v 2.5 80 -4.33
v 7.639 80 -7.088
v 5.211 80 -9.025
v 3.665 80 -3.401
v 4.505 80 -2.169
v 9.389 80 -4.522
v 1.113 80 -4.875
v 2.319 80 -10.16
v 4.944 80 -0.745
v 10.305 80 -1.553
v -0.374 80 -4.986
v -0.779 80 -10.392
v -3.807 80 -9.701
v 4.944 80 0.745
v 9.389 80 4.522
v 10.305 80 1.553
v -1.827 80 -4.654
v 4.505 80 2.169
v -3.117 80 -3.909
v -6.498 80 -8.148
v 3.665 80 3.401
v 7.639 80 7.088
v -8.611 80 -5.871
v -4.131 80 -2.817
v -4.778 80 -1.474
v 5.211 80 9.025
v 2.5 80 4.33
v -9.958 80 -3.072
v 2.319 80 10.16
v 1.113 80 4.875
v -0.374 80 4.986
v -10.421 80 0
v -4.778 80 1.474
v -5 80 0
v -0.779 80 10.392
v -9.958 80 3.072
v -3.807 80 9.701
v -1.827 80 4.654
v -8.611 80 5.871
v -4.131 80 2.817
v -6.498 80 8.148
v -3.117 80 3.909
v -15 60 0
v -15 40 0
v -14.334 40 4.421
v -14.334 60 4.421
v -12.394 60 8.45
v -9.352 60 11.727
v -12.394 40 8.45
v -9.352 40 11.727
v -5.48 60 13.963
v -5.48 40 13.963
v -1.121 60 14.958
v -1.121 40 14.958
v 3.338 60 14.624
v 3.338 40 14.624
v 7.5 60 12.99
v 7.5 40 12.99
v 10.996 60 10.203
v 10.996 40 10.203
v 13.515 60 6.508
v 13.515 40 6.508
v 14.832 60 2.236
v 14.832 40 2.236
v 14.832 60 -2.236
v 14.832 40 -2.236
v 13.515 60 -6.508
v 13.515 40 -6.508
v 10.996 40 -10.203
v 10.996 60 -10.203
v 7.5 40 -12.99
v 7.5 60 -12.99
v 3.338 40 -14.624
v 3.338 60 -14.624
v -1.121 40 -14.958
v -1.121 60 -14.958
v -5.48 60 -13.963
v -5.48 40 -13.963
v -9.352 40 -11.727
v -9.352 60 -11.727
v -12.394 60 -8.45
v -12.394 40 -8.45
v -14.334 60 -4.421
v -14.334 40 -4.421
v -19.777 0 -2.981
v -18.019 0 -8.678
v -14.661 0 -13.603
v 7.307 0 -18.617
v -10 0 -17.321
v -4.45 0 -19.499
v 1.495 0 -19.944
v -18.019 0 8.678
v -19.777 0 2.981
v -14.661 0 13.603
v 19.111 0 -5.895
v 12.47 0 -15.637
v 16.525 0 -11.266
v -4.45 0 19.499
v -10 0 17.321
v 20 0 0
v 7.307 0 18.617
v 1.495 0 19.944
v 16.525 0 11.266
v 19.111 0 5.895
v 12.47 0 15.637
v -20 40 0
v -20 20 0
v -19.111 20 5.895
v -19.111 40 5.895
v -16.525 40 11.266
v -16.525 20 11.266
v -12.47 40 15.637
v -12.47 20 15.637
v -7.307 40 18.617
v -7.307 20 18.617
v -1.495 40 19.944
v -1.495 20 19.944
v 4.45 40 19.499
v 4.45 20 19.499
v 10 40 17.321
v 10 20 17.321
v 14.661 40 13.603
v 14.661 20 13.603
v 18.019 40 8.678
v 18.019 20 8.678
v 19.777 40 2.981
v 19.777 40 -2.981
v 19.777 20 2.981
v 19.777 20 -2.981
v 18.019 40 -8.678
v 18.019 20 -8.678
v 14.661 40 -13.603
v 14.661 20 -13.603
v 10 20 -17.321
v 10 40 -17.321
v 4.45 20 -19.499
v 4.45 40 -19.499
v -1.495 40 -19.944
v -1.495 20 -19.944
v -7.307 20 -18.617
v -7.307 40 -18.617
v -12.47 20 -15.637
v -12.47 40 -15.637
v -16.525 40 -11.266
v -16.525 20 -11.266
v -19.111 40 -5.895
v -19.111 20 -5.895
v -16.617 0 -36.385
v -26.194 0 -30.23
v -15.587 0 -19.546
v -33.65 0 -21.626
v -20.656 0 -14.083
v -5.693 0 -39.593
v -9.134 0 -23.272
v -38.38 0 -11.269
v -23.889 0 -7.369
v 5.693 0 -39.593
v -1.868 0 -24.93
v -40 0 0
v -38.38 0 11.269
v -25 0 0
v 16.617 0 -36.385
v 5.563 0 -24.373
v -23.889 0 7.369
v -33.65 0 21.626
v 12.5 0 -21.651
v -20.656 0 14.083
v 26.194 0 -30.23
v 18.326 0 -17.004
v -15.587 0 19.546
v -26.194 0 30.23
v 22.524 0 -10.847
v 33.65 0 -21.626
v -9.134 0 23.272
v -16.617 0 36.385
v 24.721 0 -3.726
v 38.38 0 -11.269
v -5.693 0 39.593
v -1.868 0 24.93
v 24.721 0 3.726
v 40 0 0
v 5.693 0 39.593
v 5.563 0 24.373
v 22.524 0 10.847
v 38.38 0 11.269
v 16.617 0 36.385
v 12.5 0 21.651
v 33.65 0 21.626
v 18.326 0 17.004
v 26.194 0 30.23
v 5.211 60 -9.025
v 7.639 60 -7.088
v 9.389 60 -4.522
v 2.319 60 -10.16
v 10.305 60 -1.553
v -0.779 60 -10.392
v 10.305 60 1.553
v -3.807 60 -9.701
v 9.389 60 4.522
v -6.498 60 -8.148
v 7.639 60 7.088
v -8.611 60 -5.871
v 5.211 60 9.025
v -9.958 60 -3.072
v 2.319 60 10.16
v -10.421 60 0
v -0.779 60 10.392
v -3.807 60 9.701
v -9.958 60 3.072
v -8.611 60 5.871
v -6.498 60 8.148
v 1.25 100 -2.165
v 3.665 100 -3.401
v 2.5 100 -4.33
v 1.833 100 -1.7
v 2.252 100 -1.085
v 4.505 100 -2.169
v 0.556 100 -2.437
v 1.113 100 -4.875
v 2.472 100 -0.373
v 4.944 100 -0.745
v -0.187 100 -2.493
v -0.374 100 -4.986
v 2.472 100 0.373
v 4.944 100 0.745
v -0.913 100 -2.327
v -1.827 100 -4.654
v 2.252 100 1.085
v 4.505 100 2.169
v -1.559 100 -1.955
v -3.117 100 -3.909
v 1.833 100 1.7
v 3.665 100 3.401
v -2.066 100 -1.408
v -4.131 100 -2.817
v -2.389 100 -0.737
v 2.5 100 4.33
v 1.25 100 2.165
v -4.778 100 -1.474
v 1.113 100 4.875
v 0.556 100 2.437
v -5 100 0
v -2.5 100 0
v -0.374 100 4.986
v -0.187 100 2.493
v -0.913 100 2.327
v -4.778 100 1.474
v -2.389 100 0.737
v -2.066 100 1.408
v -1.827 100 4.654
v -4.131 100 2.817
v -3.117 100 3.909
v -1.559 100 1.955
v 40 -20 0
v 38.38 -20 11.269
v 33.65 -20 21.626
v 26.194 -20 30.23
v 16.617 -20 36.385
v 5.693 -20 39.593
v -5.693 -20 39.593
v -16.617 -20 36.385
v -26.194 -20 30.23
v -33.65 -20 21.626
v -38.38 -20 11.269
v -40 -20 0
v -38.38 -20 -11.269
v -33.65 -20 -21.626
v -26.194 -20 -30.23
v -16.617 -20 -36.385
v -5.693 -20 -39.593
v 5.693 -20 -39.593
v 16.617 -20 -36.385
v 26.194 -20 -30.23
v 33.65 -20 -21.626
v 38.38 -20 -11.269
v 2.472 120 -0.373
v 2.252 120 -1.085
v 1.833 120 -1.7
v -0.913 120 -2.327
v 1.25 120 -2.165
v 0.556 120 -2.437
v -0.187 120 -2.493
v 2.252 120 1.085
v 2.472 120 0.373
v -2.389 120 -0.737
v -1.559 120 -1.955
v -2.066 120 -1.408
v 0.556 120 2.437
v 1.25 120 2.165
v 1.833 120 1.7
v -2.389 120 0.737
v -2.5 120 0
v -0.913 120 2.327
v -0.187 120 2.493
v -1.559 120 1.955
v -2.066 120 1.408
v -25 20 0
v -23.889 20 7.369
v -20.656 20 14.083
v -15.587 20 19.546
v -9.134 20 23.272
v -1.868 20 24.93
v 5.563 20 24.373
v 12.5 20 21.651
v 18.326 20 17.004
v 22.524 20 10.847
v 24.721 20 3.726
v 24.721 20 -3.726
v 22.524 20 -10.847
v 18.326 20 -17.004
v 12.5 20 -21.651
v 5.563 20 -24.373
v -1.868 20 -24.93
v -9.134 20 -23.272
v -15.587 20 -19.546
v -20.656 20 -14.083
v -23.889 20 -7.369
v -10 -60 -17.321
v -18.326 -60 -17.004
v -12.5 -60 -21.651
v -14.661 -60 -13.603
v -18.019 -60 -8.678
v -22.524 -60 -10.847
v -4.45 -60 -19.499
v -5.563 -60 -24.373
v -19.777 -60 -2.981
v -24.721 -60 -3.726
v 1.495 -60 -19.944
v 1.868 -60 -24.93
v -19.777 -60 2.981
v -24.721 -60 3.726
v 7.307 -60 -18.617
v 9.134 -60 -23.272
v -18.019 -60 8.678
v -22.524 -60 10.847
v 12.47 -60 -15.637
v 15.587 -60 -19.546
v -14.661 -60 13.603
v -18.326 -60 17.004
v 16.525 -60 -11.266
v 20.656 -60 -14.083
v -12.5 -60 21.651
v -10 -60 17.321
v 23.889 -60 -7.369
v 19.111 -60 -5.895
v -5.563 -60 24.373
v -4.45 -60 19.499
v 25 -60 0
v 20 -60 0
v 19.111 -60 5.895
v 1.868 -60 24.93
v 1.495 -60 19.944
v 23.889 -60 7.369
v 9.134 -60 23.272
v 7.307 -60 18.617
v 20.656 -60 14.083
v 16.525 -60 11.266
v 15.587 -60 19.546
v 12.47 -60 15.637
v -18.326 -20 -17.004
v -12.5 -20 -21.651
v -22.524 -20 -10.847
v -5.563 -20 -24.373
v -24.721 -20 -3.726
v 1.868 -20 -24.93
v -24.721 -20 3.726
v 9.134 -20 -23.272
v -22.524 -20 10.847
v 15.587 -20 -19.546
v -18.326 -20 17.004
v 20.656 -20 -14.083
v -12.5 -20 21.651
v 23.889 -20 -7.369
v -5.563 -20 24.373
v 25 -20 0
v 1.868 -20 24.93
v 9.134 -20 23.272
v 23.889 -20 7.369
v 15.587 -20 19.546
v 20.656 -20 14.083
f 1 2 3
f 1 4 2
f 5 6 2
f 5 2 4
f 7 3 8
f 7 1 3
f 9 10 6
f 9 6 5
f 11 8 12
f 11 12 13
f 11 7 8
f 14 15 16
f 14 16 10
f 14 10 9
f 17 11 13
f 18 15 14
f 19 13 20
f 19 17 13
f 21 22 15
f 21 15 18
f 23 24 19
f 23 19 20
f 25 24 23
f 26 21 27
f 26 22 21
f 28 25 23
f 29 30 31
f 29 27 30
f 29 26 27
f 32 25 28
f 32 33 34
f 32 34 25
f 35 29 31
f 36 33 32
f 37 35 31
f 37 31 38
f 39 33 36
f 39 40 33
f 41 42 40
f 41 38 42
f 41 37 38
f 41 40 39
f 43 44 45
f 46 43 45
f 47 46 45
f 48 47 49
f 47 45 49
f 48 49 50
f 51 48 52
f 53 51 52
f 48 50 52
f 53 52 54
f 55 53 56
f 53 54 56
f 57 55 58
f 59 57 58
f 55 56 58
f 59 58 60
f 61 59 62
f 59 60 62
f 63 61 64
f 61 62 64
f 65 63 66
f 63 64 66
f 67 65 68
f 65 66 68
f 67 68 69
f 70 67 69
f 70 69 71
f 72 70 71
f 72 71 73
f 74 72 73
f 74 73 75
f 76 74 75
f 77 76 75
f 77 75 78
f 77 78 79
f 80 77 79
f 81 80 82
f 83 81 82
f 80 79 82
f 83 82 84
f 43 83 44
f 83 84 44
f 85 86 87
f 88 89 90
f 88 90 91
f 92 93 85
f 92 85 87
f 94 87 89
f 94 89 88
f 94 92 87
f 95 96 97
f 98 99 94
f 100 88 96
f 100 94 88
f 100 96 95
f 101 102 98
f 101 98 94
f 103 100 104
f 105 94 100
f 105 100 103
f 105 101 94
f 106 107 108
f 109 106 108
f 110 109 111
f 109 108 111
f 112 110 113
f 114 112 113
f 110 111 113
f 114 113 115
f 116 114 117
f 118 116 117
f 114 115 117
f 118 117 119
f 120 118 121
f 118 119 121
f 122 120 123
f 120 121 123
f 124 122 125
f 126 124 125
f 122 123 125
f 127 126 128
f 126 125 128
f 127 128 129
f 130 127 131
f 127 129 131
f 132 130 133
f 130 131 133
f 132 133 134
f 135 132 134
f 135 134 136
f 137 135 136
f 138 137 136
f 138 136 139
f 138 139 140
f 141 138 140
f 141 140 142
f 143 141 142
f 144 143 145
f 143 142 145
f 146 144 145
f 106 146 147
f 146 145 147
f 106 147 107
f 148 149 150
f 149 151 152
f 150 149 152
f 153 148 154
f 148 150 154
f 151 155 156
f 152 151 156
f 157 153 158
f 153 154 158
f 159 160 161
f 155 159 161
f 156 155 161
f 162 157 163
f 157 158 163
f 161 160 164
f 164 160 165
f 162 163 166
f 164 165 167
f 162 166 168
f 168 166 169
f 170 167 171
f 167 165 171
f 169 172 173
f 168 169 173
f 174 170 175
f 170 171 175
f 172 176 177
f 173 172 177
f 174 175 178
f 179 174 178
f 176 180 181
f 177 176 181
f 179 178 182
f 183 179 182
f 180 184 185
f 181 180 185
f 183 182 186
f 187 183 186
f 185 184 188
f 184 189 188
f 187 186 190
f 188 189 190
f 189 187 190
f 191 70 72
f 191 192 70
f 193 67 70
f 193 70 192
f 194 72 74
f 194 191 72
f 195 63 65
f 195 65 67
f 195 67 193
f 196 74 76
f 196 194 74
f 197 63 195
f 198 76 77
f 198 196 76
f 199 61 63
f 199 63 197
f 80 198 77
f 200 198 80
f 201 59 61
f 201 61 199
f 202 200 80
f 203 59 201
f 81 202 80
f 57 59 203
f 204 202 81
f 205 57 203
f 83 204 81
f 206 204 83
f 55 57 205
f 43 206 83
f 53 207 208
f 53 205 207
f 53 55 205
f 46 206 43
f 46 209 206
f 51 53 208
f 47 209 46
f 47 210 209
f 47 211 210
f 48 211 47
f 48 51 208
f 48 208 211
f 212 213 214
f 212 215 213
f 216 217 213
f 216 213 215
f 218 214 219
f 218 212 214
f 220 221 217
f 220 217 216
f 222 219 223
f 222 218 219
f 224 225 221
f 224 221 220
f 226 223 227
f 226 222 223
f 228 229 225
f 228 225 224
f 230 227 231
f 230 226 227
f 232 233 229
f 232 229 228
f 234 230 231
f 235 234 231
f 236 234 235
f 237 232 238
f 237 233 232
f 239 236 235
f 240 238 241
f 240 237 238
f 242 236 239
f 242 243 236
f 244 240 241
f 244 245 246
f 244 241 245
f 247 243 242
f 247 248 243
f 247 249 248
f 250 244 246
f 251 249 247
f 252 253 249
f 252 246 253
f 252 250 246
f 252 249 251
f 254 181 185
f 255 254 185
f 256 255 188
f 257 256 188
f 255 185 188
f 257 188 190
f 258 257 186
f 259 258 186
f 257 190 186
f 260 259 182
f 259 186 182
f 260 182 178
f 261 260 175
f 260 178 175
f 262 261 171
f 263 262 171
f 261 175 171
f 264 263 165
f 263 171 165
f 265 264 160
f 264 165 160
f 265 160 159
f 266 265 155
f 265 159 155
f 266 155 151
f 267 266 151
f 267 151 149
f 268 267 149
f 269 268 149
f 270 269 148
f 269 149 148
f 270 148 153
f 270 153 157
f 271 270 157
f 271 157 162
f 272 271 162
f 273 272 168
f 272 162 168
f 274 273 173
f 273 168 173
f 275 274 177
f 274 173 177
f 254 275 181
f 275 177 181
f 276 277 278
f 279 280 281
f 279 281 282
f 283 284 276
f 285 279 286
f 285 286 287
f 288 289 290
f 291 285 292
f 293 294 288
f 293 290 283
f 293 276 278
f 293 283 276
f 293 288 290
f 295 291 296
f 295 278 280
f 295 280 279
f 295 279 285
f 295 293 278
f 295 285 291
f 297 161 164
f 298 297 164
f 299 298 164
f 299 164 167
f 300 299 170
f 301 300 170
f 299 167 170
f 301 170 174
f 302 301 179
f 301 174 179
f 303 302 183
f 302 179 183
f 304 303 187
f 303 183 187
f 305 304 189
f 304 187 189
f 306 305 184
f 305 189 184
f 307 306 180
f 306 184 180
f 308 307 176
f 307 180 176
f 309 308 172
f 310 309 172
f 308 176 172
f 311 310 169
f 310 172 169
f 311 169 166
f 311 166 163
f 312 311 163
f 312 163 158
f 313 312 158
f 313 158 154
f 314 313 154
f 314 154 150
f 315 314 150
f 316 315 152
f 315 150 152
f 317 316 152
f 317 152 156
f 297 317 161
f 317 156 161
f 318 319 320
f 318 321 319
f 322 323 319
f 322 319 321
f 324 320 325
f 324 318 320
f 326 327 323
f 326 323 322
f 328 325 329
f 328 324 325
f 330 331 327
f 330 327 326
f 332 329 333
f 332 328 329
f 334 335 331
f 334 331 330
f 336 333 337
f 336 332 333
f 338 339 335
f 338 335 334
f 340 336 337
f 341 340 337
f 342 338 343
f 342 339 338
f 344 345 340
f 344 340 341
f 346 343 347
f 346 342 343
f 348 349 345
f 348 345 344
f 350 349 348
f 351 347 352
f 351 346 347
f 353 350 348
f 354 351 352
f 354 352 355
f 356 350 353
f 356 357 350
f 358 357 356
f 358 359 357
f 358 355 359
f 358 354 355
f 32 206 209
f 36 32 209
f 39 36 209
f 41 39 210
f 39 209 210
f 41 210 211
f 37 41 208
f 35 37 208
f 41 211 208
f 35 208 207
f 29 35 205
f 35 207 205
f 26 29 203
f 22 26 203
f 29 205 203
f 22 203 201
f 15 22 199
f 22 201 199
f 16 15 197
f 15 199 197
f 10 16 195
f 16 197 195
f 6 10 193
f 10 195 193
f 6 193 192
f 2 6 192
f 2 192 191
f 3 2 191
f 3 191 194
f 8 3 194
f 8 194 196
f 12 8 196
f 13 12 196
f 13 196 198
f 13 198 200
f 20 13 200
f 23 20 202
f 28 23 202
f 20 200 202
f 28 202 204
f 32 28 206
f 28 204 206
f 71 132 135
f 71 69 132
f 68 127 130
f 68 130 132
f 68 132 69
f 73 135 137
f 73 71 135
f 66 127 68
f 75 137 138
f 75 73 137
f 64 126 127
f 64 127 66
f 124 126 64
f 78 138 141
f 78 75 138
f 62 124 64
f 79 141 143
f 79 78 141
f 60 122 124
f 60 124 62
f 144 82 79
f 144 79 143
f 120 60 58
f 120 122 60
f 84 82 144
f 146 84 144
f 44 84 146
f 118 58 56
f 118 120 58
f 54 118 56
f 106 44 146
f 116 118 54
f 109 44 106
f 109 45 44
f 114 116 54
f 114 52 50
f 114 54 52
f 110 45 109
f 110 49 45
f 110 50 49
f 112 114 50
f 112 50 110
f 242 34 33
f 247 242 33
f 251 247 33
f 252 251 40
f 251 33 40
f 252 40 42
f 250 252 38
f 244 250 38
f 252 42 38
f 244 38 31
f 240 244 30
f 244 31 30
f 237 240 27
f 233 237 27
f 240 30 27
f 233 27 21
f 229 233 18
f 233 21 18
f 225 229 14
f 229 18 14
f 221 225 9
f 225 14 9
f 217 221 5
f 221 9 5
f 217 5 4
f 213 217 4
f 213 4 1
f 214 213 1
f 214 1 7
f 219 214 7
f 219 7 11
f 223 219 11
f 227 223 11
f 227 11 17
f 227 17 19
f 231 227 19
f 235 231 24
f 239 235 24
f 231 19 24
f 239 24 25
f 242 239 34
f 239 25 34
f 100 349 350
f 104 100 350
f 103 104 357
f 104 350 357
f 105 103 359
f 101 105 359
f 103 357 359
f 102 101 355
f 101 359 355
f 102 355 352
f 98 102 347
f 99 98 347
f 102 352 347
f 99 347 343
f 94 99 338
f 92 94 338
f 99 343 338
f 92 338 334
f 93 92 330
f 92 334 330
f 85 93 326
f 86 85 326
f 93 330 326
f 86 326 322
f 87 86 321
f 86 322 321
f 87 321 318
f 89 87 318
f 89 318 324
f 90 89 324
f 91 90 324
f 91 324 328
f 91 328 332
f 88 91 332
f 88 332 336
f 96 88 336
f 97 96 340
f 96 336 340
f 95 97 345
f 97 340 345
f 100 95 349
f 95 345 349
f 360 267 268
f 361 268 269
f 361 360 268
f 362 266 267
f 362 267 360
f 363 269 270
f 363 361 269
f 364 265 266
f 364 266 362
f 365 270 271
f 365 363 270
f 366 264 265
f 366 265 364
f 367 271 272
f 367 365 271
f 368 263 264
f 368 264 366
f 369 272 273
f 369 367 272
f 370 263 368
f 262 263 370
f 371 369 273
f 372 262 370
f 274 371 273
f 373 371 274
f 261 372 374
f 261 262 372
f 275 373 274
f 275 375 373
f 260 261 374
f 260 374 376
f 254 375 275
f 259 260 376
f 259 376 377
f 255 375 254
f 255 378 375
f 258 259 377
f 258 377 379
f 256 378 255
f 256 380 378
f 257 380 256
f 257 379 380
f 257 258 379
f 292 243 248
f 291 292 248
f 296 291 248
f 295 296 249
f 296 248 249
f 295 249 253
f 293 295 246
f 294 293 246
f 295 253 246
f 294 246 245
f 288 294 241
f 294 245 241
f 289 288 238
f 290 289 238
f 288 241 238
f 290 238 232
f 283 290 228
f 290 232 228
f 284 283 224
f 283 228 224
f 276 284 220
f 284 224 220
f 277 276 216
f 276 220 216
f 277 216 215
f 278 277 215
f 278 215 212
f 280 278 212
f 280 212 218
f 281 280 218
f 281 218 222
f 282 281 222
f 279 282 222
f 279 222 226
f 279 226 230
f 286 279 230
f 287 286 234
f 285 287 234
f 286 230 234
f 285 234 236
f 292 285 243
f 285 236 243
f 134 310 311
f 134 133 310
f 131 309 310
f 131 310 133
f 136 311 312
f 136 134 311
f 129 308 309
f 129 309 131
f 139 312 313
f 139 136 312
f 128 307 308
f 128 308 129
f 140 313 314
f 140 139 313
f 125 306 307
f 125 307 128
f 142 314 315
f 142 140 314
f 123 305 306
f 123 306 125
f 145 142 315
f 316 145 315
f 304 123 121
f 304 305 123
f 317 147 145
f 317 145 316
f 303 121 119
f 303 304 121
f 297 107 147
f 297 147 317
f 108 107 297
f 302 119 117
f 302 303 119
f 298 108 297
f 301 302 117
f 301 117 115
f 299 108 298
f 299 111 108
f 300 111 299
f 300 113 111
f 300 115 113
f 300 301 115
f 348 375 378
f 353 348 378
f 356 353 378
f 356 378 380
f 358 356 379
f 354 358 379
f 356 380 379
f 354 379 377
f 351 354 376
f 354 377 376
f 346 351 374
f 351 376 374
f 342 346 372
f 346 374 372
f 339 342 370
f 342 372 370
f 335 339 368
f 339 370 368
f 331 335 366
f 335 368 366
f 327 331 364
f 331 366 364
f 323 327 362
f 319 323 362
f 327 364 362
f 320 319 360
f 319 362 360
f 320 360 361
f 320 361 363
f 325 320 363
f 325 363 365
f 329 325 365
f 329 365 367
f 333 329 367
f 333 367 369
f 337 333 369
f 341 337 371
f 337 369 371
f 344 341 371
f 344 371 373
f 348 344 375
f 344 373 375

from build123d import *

# Parameters (mm, degrees)
F0_R      = 40
F1_DEPTH  = 20
F2_R      = 25
F3_DEPTH  = 20
F4_R      = 20
F5_DEPTH  = 20
F6_R      = 15
F7_DEPTH  = 20
F8_R      = 10.4214785956
F9_DEPTH  = 20
F10_R     = 5
F11_DEPTH = 20
F12_R     = 2.5
F13_DEPTH = 20
F14_R     = 25
F15_DEPTH = 40
F16_R     = 20
F17_DEPTH = 60


with BuildPart() as f1:
    # F0 (on Front) → F1 (new body)
    with BuildSketch(Plane.XZ):
        Circle(F0_R)
    extrude(amount=F1_DEPTH)

    # F2 (on face) → F3 (join)
    with BuildSketch(Plane(origin=(0, 0, 0), x_dir=(-1, 0, 0), z_dir=(0, 1, 0))):
        Circle(F2_R)
    extrude(amount=F3_DEPTH)

    # F4 (on face) → F5 (join)
    with BuildSketch(Plane(origin=(0, 20, 0), x_dir=(-1, 0, 0), z_dir=(0, 1, 0))):
        Circle(F4_R)
    extrude(amount=F5_DEPTH)

    # F6 (on face) → F7 (join)
    with BuildSketch(Plane(origin=(0, 40, 0), x_dir=(-1, 0, 0), z_dir=(0, 1, 0))):
        Circle(F6_R)
    extrude(amount=F7_DEPTH)

    # F8 (on face) → F9 (join)
    with BuildSketch(Plane(origin=(0, 60, 0), x_dir=(-1, 0, 0), z_dir=(0, 1, 0))):
        Circle(F8_R)
    extrude(amount=F9_DEPTH)

    # F10 (on face) → F11 (join)
    with BuildSketch(Plane(origin=(0, 80, 0), x_dir=(-1, 0, 0), z_dir=(0, 1, 0))):
        Circle(F10_R)
    extrude(amount=F11_DEPTH)

    # F12 (on face) → F13 (join)
    with BuildSketch(Plane(origin=(0, 100, 0), x_dir=(-1, 0, 0), z_dir=(0, 1, 0))):
        Circle(F12_R)
    extrude(amount=F13_DEPTH)

    # F14 (on face) → F15 (join)
    with BuildSketch(Plane.XZ.offset(20)):
        Circle(F14_R)
    extrude(amount=F15_DEPTH)

    # F16 (on face) → F17 (cut)
    with BuildSketch(Plane.XZ.offset(60)):
        Circle(F16_R)
    extrude(amount=-F17_DEPTH, mode=Mode.SUBTRACT)


solid = f1.part
